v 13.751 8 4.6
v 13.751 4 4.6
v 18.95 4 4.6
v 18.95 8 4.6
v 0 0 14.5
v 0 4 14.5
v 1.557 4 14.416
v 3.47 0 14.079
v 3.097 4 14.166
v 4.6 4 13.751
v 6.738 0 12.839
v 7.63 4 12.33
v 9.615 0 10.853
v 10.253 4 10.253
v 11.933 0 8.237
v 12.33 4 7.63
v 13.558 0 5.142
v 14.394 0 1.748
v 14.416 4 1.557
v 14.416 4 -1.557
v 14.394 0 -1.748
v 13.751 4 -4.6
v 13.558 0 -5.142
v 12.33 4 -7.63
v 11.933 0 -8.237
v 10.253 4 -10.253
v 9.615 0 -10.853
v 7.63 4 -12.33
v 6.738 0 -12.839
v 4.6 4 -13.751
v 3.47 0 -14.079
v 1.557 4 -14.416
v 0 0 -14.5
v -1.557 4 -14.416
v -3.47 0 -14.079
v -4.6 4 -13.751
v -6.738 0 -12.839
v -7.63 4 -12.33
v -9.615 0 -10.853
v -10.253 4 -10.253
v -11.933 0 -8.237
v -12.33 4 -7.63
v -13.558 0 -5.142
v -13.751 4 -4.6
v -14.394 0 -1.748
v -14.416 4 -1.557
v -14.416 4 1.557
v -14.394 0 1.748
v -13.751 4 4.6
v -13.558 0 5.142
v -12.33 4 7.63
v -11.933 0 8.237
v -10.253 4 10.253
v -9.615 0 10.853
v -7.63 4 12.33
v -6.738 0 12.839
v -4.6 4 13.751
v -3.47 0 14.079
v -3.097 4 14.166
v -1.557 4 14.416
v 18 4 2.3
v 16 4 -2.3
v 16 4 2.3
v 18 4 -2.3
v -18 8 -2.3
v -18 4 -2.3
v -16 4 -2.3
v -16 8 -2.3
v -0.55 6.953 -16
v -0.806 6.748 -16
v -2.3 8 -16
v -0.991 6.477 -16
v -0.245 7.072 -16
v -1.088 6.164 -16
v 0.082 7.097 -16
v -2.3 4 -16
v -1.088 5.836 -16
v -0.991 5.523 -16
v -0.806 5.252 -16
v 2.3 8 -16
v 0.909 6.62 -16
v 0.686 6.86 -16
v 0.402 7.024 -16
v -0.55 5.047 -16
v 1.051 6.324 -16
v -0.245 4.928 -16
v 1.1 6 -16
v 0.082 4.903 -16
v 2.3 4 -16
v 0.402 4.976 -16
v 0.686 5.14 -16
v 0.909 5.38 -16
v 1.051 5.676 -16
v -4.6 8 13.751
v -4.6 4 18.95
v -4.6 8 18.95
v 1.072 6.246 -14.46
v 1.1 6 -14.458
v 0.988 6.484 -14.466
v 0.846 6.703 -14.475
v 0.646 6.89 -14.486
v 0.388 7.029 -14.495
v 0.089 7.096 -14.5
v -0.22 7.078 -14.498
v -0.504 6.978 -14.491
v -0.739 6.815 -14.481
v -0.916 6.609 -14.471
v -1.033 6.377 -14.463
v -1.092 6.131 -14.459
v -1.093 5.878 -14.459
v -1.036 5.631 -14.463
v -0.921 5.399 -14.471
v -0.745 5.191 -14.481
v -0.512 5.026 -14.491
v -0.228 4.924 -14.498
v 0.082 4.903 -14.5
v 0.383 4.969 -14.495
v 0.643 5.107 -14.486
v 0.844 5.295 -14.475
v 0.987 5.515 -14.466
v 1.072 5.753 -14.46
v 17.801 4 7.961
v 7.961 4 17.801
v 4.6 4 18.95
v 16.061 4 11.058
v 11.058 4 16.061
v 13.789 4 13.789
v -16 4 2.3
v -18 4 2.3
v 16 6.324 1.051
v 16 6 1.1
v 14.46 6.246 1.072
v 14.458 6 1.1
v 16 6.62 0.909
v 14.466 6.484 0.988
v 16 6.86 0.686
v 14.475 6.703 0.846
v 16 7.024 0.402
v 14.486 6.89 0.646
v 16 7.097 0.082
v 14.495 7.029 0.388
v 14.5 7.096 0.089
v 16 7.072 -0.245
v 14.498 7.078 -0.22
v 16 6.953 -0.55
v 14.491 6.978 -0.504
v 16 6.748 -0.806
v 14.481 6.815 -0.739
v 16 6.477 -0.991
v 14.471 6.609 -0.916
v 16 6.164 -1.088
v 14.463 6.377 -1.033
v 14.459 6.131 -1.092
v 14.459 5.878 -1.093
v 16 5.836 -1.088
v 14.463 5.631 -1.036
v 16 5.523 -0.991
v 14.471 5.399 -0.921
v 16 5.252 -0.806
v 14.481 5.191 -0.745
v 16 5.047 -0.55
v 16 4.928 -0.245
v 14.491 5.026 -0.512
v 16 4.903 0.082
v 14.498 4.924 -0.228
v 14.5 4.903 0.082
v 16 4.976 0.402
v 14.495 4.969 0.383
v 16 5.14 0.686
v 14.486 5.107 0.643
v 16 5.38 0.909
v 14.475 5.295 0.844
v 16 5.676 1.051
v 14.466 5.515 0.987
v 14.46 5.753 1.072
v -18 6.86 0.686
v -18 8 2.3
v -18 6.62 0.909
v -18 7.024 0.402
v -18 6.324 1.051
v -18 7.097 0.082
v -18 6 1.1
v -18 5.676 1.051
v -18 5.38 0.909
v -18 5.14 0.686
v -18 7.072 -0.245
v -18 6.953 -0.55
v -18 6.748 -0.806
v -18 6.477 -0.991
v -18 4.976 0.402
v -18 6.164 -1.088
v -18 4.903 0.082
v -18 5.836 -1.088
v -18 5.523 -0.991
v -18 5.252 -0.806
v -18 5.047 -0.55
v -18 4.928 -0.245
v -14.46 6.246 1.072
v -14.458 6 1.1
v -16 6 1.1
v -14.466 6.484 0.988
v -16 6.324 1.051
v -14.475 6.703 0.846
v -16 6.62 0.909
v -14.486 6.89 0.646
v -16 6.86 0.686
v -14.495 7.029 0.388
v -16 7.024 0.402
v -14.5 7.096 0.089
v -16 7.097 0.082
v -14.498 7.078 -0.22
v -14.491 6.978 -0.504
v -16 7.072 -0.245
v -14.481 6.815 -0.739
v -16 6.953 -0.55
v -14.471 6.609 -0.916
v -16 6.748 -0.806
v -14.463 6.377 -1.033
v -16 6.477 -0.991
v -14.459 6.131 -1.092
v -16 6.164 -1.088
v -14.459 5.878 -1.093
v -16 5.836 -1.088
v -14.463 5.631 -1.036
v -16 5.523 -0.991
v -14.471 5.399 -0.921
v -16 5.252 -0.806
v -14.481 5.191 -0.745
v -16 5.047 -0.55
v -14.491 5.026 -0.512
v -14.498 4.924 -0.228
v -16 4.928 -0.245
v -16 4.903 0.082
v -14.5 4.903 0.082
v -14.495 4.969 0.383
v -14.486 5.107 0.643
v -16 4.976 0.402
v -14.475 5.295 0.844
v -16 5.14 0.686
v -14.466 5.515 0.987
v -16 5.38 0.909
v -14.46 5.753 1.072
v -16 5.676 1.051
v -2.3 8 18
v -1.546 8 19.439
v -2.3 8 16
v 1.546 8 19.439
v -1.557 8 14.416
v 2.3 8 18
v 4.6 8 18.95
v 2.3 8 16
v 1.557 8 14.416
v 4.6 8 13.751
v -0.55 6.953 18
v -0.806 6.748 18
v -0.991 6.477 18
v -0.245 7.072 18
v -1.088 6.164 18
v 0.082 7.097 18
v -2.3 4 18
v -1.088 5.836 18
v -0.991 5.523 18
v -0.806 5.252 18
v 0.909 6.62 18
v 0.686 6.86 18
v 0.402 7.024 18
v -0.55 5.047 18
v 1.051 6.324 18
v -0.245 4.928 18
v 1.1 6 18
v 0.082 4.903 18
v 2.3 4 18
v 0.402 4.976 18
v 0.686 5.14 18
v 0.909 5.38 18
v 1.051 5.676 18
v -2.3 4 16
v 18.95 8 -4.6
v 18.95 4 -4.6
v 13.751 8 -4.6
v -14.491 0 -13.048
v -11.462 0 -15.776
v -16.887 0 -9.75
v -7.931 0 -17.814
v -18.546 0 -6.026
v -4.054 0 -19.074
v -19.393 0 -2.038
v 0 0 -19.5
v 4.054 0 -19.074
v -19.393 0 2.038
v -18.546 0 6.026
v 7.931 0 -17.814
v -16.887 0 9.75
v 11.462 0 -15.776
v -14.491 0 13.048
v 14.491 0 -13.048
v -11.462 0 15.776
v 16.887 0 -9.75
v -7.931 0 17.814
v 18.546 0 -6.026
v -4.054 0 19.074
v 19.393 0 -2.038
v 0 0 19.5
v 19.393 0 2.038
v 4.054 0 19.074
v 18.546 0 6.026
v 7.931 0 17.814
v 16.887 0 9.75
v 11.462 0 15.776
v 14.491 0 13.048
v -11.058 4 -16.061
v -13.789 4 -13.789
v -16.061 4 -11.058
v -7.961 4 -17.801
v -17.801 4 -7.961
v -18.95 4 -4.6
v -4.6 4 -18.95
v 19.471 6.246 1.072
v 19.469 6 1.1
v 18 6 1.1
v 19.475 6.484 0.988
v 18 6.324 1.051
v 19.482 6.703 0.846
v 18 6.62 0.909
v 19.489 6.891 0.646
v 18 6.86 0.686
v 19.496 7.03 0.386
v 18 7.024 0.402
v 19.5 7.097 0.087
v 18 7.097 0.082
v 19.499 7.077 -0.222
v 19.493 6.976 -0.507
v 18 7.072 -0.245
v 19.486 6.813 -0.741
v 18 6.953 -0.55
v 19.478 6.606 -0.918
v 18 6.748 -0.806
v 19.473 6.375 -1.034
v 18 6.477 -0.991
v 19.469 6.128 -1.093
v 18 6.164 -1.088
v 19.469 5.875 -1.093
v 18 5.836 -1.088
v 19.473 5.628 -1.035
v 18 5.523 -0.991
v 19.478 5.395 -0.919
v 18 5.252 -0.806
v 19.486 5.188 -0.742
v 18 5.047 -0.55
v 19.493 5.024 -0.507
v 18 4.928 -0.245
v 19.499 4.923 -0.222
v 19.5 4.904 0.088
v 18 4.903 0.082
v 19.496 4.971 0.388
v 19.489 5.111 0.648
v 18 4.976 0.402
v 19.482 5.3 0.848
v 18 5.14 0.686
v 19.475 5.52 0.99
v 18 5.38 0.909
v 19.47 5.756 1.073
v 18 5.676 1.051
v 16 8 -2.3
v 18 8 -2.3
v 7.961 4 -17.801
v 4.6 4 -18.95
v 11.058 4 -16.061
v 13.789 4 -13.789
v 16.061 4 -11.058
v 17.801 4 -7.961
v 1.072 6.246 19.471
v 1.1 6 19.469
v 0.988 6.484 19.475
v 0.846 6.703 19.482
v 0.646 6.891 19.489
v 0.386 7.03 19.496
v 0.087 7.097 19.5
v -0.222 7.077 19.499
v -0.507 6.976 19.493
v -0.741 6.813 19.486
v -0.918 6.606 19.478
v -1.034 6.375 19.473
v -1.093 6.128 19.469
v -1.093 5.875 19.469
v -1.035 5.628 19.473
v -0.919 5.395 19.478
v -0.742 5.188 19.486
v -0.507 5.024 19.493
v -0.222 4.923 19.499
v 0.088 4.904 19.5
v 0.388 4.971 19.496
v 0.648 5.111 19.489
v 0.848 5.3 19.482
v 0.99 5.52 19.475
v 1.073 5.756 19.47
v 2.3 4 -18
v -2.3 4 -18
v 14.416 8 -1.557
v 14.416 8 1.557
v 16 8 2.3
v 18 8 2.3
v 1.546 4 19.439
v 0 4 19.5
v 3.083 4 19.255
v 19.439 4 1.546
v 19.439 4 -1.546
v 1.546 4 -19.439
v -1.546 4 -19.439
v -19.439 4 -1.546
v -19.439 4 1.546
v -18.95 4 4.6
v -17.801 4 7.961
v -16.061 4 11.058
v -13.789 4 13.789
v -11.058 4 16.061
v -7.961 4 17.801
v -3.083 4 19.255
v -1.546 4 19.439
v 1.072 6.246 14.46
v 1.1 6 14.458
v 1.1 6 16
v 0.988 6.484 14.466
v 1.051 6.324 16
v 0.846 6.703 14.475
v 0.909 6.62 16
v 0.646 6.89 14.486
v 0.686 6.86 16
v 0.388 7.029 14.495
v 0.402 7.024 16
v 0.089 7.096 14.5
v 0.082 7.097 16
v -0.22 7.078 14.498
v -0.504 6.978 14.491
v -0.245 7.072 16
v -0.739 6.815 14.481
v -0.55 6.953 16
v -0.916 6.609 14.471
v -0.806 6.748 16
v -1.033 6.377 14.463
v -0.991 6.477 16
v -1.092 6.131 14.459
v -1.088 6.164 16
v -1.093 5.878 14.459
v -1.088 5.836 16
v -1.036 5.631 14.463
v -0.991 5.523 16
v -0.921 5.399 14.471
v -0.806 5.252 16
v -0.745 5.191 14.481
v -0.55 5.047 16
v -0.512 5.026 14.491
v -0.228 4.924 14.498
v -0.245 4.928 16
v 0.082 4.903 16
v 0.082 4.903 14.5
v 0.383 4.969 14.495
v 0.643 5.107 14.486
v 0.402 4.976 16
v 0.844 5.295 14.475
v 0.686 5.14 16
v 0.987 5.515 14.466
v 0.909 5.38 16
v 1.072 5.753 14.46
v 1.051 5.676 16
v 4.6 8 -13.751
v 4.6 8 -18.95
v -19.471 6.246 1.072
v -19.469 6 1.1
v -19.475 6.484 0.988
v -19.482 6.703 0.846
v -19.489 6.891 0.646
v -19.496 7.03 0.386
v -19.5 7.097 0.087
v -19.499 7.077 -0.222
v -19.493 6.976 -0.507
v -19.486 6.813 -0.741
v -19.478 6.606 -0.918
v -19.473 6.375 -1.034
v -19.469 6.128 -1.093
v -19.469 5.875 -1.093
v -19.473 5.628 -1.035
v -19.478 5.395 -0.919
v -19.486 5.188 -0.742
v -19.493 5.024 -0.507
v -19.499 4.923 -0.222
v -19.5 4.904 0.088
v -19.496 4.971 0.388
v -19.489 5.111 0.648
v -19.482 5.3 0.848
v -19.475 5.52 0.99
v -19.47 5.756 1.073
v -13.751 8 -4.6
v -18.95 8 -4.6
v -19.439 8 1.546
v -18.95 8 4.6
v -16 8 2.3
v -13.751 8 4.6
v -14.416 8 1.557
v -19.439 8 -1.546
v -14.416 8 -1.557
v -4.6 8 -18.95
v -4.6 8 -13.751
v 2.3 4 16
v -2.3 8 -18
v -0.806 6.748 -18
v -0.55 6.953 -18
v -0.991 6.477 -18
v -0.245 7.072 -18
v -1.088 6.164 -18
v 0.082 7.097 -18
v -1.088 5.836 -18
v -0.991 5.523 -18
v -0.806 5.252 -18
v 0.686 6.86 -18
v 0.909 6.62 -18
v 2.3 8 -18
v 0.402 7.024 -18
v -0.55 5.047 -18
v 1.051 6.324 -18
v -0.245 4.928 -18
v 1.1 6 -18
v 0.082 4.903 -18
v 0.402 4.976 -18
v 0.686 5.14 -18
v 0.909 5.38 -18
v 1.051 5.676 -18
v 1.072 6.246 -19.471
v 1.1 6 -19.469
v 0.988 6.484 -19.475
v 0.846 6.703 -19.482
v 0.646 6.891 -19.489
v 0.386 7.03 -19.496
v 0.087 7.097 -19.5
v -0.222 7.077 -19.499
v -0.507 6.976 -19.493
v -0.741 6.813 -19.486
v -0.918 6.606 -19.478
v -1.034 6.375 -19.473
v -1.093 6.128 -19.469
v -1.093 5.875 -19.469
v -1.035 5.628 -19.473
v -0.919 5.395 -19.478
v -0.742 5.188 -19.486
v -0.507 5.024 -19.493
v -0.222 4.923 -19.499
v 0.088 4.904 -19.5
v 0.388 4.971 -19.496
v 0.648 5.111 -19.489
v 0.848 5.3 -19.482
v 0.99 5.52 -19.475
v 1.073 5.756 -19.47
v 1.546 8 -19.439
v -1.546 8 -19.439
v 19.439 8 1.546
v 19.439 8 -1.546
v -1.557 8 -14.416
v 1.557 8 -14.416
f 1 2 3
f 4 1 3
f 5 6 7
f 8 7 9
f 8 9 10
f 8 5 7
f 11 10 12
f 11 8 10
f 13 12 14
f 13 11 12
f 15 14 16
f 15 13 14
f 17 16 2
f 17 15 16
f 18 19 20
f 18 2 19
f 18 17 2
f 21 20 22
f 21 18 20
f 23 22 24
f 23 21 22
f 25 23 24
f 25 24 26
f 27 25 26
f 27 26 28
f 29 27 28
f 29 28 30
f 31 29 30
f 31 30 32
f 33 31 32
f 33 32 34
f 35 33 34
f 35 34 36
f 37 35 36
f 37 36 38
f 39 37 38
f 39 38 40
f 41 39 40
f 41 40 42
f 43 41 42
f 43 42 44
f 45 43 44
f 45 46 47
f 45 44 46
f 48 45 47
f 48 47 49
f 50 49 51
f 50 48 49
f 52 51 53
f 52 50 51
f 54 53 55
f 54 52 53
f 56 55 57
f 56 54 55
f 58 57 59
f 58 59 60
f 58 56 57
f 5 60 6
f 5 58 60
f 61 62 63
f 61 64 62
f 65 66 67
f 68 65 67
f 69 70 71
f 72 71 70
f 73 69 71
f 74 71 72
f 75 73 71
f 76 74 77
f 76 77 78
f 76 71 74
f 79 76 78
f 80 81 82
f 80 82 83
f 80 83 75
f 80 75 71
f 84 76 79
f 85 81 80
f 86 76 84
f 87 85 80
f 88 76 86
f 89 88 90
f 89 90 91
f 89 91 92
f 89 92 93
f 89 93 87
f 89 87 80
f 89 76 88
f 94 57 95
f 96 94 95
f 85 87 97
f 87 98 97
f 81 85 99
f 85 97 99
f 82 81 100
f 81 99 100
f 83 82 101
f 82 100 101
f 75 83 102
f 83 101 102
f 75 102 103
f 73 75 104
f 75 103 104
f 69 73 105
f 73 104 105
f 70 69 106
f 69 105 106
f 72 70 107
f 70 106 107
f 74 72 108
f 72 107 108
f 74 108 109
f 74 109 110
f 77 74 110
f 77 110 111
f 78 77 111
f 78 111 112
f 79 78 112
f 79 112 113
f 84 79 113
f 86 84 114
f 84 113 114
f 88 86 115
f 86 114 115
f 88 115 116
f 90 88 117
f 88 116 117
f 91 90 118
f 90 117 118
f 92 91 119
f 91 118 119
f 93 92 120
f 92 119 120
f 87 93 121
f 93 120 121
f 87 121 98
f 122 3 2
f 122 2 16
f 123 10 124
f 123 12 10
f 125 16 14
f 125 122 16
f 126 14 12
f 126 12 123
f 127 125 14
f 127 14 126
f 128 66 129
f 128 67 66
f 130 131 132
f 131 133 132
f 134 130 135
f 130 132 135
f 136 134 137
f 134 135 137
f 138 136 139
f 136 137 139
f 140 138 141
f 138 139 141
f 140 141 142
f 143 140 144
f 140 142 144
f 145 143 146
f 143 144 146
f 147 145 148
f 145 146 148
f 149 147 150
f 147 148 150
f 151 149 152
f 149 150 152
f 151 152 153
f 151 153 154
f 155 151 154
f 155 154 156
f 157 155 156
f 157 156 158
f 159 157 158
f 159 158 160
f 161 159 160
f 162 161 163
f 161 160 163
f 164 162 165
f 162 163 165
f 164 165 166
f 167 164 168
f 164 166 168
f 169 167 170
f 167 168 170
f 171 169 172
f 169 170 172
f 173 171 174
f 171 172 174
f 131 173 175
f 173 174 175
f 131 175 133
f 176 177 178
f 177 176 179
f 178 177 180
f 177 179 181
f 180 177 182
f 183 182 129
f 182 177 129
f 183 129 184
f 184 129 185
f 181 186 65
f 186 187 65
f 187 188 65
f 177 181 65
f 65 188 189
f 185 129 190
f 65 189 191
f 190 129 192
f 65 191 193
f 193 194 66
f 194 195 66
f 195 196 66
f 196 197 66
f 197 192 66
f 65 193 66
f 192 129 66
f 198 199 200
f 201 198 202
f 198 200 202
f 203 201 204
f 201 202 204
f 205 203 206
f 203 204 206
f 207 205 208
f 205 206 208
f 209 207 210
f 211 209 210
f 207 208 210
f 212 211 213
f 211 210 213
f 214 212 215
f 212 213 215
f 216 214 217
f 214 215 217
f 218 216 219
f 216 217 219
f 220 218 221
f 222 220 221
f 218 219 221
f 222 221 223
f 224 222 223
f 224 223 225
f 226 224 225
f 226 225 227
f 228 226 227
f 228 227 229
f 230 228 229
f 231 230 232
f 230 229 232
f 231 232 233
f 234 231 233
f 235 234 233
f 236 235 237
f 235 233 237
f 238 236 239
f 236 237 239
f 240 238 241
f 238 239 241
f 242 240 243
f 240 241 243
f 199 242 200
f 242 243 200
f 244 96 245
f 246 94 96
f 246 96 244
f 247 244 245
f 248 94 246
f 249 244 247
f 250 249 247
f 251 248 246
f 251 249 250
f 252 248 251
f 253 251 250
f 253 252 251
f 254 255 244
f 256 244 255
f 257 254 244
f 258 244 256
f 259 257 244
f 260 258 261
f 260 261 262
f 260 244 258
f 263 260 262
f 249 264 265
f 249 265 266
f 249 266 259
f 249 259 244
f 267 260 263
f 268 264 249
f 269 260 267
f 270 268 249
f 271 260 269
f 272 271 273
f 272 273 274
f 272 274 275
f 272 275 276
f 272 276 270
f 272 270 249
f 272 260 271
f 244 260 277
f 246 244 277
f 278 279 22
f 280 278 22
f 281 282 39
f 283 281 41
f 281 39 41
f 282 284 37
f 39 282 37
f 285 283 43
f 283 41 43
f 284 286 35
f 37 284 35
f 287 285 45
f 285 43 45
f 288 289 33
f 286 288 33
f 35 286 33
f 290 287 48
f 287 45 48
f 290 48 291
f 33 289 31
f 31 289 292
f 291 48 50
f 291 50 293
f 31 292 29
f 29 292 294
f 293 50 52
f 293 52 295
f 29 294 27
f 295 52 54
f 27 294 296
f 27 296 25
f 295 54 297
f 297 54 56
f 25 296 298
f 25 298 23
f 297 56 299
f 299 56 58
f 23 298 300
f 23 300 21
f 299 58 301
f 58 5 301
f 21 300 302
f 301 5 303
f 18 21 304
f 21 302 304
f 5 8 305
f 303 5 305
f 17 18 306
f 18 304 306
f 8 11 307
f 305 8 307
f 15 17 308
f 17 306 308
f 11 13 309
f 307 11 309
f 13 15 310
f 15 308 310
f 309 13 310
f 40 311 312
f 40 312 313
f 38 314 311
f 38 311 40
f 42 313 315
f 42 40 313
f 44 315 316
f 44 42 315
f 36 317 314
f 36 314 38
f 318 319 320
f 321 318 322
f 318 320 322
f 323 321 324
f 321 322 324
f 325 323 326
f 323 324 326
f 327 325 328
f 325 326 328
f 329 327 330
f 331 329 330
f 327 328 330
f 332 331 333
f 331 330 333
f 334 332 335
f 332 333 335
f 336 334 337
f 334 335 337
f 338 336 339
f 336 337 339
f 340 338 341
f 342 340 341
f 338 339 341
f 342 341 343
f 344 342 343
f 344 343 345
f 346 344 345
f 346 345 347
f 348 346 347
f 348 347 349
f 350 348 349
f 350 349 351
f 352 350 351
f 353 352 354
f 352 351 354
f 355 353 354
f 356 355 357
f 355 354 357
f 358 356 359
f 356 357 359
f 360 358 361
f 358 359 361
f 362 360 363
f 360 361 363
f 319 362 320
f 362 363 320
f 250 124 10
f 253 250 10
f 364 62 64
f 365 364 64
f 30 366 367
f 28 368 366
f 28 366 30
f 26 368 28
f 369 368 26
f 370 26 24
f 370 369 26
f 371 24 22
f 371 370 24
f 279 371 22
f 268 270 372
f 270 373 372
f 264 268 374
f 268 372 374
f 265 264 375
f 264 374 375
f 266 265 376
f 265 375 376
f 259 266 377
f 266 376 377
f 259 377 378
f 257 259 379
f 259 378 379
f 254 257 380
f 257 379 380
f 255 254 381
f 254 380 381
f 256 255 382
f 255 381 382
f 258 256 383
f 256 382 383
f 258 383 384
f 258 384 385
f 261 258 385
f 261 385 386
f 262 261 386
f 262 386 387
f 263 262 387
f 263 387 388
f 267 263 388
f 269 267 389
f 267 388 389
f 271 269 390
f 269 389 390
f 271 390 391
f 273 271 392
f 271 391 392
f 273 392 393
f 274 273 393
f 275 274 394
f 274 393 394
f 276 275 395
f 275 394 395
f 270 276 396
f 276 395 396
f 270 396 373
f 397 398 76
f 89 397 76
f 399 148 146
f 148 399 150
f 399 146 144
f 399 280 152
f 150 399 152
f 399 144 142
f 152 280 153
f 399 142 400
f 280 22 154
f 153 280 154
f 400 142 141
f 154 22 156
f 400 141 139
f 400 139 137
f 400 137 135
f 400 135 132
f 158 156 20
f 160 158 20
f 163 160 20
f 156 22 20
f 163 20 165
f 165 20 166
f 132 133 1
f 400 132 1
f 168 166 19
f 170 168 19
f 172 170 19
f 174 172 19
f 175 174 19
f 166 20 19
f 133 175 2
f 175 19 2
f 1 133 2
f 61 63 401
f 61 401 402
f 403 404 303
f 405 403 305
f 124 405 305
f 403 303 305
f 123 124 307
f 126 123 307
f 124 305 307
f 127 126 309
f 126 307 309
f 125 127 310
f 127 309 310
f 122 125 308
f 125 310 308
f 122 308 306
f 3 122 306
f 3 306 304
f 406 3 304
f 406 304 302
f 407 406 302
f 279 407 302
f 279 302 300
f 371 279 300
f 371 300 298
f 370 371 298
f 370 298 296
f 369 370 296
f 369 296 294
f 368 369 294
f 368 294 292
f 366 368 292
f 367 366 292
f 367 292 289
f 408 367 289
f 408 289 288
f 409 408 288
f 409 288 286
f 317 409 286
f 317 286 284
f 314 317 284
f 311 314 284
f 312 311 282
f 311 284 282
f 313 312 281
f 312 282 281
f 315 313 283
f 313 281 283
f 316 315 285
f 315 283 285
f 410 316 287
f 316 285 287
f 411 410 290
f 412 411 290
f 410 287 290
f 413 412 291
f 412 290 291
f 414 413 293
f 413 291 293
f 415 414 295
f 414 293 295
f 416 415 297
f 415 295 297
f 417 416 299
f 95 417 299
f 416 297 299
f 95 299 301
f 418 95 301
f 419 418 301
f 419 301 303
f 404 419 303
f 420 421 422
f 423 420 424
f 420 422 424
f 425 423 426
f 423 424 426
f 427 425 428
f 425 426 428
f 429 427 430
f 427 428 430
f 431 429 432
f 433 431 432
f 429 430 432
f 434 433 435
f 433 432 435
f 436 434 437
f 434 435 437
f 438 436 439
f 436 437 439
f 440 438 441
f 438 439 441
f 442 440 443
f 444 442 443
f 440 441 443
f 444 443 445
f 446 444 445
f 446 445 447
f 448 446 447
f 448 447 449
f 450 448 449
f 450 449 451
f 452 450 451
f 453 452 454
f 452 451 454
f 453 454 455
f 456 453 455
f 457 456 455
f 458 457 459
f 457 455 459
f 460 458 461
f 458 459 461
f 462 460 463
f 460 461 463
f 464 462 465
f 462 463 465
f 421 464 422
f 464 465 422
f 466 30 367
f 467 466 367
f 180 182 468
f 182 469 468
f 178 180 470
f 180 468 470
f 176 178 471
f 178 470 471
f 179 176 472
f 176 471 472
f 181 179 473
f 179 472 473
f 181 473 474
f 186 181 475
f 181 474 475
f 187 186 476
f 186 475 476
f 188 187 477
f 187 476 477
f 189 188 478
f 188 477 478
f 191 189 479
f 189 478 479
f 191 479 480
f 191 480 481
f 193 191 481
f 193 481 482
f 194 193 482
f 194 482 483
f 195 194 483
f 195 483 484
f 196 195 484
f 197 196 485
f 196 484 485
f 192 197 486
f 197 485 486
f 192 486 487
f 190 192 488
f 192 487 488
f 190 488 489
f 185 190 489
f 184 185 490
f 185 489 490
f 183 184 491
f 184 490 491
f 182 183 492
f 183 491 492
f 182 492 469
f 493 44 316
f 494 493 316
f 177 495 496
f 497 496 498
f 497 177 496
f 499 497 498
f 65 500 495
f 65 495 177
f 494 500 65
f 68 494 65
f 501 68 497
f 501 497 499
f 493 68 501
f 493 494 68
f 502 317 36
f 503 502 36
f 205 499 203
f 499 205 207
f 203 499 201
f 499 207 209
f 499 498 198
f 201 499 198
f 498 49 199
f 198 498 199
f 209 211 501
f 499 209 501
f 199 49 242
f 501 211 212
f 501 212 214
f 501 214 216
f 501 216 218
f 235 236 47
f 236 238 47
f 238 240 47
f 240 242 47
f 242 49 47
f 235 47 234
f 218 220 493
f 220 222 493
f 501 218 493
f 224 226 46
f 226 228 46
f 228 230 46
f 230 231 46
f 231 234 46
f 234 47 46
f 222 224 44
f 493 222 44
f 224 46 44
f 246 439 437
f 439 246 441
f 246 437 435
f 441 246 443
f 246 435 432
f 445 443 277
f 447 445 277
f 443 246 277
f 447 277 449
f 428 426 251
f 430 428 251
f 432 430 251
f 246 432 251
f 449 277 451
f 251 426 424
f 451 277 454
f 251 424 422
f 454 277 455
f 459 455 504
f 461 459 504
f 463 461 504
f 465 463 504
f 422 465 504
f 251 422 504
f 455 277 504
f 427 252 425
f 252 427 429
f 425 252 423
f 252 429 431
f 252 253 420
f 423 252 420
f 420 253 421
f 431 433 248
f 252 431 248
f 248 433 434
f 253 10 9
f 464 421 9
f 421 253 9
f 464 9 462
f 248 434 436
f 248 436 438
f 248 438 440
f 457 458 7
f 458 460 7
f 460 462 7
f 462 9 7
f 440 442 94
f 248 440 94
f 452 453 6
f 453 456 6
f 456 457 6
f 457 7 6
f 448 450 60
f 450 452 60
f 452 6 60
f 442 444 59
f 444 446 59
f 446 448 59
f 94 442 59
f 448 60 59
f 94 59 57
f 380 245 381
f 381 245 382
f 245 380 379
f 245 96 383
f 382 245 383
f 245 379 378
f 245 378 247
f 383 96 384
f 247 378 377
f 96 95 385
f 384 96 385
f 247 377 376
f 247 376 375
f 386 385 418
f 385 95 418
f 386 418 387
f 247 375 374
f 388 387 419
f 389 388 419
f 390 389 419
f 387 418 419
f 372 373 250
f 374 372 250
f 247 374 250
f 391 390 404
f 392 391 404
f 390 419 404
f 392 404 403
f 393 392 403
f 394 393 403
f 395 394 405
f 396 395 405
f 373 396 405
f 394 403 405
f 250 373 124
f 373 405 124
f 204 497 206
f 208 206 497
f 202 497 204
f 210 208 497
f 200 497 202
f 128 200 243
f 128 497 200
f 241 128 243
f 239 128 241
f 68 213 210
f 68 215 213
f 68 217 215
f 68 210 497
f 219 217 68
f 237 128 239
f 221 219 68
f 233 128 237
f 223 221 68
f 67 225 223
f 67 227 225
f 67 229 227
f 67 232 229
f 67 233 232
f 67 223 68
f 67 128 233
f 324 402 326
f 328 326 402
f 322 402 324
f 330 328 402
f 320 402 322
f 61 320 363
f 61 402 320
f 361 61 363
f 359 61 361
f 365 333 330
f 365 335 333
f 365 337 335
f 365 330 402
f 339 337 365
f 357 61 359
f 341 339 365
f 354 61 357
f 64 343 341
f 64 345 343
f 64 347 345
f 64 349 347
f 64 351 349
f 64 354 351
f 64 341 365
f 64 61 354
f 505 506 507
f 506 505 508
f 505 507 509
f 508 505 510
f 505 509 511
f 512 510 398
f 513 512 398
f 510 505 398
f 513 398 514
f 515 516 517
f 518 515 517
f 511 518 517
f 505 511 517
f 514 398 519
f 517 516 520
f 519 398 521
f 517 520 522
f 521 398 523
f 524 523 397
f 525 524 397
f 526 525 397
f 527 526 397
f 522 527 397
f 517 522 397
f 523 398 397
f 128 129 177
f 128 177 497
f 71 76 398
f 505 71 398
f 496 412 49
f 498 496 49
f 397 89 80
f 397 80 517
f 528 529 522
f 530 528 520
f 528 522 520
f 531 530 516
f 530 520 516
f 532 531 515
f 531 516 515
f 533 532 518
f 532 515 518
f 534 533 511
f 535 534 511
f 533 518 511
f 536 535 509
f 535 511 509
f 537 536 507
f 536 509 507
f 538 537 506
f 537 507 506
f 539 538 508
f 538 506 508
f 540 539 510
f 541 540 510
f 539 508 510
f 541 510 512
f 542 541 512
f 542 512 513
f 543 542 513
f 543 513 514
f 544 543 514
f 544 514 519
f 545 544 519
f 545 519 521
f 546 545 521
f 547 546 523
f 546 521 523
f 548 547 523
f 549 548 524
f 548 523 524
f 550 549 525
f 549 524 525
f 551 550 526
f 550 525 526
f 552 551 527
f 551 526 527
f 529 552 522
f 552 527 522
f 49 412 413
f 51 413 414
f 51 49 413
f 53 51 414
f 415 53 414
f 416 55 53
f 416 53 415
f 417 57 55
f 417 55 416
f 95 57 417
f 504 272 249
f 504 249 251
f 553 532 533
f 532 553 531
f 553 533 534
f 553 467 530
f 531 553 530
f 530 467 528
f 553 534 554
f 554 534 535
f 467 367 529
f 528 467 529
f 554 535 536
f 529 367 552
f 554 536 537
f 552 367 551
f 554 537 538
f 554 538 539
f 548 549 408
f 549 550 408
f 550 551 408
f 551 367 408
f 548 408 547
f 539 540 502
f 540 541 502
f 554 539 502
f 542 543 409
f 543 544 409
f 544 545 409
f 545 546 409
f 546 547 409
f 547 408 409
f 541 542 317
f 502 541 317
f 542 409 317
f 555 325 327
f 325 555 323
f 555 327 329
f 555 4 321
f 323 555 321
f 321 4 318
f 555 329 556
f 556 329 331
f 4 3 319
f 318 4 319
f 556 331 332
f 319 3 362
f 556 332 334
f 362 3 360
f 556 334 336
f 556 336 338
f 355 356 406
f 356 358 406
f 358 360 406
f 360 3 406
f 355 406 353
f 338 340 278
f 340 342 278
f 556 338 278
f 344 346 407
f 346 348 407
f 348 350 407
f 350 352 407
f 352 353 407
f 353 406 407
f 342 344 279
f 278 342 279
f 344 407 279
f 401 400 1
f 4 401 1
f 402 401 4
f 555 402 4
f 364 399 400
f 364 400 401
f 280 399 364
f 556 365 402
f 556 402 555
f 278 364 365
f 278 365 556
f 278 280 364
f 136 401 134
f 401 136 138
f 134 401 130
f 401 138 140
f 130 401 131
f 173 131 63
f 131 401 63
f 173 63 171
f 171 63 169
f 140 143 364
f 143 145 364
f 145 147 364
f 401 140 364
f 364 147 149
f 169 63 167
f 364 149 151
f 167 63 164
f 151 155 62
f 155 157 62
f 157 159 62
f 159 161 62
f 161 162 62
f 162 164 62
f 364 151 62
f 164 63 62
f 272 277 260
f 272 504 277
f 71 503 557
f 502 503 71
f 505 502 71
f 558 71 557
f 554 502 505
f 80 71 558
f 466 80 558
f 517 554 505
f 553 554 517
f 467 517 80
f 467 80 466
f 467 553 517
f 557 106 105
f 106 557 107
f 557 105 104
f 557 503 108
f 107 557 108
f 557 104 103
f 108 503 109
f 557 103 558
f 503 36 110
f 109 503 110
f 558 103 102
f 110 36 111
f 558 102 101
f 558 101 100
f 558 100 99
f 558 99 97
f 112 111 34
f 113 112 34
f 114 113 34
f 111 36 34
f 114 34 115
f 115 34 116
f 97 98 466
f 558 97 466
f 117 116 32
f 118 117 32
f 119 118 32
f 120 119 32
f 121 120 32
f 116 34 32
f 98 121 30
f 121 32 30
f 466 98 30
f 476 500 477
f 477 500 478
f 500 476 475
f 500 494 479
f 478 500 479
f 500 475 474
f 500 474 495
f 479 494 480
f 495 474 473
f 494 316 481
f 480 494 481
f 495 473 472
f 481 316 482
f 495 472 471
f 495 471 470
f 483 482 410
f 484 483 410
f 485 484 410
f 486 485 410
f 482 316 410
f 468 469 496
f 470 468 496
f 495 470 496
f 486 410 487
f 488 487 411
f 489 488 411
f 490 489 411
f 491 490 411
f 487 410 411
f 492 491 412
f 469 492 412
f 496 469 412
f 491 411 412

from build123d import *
from build123d.topology import SkipClean

# Parameters (mm, degrees)
SKETCH_1_R               = 19.5
SKETCH_1_R_2             = 14.5
EXTRUDE_1_DEPTH          = 4
SKETCH_3_W               = 4.6
SKETCH_3_H               = 2
SKETCH_3_W_2             = 2
SKETCH_3_H_2             = 4.6
EXTRUDE_3_DEPTH          = 4
SKETCH_12_R              = 1.1
CUT_EXTRUDE_2_DEPTH      = 44.017438324
PATTERN_CIRCULAR_2_COUNT = 2
PATTERN_CIRCULAR_2_ANGLE = 90


with BuildPart() as part:
    # Эскиз1 → Бобышка-Вытянуть1 (new body)
    with BuildSketch(Plane(origin=(0, 0, 0), x_dir=(1, 0, 0), z_dir=(0, 1, 0))):
        with Locations(Location((0, 0, 0), (0, 0, 270))):
            Circle(SKETCH_1_R)
        with Locations(Location((0, 0, 0), (0, 0, 270))):
            Circle(SKETCH_1_R_2, mode=Mode.SUBTRACT)
    extrude(amount=EXTRUDE_1_DEPTH)

    # Эскиз3 → Бобышка-Вытянуть3 (add)
    # profile 1 of 4: a face of its own
    with SkipClean():  # the faces are left unmerged after this step: merging them gives an invalid solid
        with BuildSketch(Plane(origin=(0, 4, 0), x_dir=(1, 0, 0), z_dir=(0, 1, 0))):
            with BuildLine():
                Line((-4.599991072, 18.949672349), (-4.599991072, 13.75100295))
                ThreePointArc((-4.599991072, 13.75100295), (0, 14.5), (4.599991072, 13.75100295))
                Line((4.599991072, 13.75100295), (4.599991072, 18.949672349))
                ThreePointArc((4.599991072, 18.949672349), (0, 19.5), (-4.599991072, 18.949672349))
            make_face()
            with Locations((0, 17)):
                Rectangle(SKETCH_3_W, SKETCH_3_H, mode=Mode.SUBTRACT)
        # profile 2 of 4: a face of its own
        with BuildSketch(Plane(origin=(0, 4, 0), x_dir=(1, 0, 0), z_dir=(0, 1, 0))):
            with BuildLine():
                Line((18.949672349, 4.599991072), (13.75100295, 4.599991072))
                ThreePointArc((13.75100295, 4.599991072), (14.5, 0), (13.75100295, -4.599991072))
                Line((13.75100295, -4.599991072), (18.949672349, -4.599991072))
                ThreePointArc((18.949672349, -4.599991072), (19.5, 0), (18.949672349, 4.599991072))
            make_face()
            with Locations((17, 0)):
                Rectangle(SKETCH_3_W_2, SKETCH_3_H_2, mode=Mode.SUBTRACT)
        # profile 3 of 4: a face of its own
        with BuildSketch(Plane(origin=(0, 4, 0), x_dir=(1, 0, 0), z_dir=(0, 1, 0))):
            with BuildLine():
                Line((4.599991072, -18.949672349), (4.599991072, -13.75100295))
                ThreePointArc((4.599991072, -13.75100295), (0, -14.5), (-4.599991072, -13.75100295))
                Line((-4.599991072, -13.75100295), (-4.599991072, -18.949672349))
                ThreePointArc((-4.599991072, -18.949672349), (0, -19.5), (4.599991072, -18.949672349))
            make_face()
            with Locations((0, -17)):
                Rectangle(SKETCH_3_W, SKETCH_3_H, mode=Mode.SUBTRACT)
        # profile 4 of 4: a face of its own
        with BuildSketch(Plane(origin=(0, 4, 0), x_dir=(1, 0, 0), z_dir=(0, 1, 0))):
            with BuildLine():
                Line((-18.949672349, -4.599991072), (-13.75100295, -4.599991072))
                ThreePointArc((-13.75100295, -4.599991072), (-14.5, 0), (-13.75100295, 4.599991072))
                Line((-13.75100295, 4.599991072), (-18.949672349, 4.599991072))
                ThreePointArc((-18.949672349, 4.599991072), (-19.5, 0), (-18.949672349, -4.599991072))
            make_face()
            with Locations((-17, 0)):
                Rectangle(SKETCH_3_W_2, SKETCH_3_H_2, mode=Mode.SUBTRACT)
        extrude(amount=EXTRUDE_3_DEPTH)

    # Эскиз12 → Вырез-Вытянуть2 (cut, symmetric)
    with SkipClean():  # the faces are left unmerged after this step: merging them gives an invalid solid
        with BuildSketch(Plane.XY.offset(-18)):
            with Locations((0, 6)):
                Circle(SKETCH_12_R)
        cut_extrude_2 = extrude(amount=CUT_EXTRUDE_2_DEPTH, both=True, mode=Mode.SUBTRACT)

    # Круговой массив2: Вырез-Вытянуть2 ×2 about axis
    with SkipClean():  # the faces are left unmerged after this step: merging them gives an invalid solid
        pattern_circular_2_axis = Axis((0, 4, 0), (0, -1, 0))
        for i in range(1, PATTERN_CIRCULAR_2_COUNT):
            add(cut_extrude_2.rotate(pattern_circular_2_axis, i * PATTERN_CIRCULAR_2_ANGLE / (PATTERN_CIRCULAR_2_COUNT - 1)), mode=Mode.SUBTRACT)


solid = part.part
